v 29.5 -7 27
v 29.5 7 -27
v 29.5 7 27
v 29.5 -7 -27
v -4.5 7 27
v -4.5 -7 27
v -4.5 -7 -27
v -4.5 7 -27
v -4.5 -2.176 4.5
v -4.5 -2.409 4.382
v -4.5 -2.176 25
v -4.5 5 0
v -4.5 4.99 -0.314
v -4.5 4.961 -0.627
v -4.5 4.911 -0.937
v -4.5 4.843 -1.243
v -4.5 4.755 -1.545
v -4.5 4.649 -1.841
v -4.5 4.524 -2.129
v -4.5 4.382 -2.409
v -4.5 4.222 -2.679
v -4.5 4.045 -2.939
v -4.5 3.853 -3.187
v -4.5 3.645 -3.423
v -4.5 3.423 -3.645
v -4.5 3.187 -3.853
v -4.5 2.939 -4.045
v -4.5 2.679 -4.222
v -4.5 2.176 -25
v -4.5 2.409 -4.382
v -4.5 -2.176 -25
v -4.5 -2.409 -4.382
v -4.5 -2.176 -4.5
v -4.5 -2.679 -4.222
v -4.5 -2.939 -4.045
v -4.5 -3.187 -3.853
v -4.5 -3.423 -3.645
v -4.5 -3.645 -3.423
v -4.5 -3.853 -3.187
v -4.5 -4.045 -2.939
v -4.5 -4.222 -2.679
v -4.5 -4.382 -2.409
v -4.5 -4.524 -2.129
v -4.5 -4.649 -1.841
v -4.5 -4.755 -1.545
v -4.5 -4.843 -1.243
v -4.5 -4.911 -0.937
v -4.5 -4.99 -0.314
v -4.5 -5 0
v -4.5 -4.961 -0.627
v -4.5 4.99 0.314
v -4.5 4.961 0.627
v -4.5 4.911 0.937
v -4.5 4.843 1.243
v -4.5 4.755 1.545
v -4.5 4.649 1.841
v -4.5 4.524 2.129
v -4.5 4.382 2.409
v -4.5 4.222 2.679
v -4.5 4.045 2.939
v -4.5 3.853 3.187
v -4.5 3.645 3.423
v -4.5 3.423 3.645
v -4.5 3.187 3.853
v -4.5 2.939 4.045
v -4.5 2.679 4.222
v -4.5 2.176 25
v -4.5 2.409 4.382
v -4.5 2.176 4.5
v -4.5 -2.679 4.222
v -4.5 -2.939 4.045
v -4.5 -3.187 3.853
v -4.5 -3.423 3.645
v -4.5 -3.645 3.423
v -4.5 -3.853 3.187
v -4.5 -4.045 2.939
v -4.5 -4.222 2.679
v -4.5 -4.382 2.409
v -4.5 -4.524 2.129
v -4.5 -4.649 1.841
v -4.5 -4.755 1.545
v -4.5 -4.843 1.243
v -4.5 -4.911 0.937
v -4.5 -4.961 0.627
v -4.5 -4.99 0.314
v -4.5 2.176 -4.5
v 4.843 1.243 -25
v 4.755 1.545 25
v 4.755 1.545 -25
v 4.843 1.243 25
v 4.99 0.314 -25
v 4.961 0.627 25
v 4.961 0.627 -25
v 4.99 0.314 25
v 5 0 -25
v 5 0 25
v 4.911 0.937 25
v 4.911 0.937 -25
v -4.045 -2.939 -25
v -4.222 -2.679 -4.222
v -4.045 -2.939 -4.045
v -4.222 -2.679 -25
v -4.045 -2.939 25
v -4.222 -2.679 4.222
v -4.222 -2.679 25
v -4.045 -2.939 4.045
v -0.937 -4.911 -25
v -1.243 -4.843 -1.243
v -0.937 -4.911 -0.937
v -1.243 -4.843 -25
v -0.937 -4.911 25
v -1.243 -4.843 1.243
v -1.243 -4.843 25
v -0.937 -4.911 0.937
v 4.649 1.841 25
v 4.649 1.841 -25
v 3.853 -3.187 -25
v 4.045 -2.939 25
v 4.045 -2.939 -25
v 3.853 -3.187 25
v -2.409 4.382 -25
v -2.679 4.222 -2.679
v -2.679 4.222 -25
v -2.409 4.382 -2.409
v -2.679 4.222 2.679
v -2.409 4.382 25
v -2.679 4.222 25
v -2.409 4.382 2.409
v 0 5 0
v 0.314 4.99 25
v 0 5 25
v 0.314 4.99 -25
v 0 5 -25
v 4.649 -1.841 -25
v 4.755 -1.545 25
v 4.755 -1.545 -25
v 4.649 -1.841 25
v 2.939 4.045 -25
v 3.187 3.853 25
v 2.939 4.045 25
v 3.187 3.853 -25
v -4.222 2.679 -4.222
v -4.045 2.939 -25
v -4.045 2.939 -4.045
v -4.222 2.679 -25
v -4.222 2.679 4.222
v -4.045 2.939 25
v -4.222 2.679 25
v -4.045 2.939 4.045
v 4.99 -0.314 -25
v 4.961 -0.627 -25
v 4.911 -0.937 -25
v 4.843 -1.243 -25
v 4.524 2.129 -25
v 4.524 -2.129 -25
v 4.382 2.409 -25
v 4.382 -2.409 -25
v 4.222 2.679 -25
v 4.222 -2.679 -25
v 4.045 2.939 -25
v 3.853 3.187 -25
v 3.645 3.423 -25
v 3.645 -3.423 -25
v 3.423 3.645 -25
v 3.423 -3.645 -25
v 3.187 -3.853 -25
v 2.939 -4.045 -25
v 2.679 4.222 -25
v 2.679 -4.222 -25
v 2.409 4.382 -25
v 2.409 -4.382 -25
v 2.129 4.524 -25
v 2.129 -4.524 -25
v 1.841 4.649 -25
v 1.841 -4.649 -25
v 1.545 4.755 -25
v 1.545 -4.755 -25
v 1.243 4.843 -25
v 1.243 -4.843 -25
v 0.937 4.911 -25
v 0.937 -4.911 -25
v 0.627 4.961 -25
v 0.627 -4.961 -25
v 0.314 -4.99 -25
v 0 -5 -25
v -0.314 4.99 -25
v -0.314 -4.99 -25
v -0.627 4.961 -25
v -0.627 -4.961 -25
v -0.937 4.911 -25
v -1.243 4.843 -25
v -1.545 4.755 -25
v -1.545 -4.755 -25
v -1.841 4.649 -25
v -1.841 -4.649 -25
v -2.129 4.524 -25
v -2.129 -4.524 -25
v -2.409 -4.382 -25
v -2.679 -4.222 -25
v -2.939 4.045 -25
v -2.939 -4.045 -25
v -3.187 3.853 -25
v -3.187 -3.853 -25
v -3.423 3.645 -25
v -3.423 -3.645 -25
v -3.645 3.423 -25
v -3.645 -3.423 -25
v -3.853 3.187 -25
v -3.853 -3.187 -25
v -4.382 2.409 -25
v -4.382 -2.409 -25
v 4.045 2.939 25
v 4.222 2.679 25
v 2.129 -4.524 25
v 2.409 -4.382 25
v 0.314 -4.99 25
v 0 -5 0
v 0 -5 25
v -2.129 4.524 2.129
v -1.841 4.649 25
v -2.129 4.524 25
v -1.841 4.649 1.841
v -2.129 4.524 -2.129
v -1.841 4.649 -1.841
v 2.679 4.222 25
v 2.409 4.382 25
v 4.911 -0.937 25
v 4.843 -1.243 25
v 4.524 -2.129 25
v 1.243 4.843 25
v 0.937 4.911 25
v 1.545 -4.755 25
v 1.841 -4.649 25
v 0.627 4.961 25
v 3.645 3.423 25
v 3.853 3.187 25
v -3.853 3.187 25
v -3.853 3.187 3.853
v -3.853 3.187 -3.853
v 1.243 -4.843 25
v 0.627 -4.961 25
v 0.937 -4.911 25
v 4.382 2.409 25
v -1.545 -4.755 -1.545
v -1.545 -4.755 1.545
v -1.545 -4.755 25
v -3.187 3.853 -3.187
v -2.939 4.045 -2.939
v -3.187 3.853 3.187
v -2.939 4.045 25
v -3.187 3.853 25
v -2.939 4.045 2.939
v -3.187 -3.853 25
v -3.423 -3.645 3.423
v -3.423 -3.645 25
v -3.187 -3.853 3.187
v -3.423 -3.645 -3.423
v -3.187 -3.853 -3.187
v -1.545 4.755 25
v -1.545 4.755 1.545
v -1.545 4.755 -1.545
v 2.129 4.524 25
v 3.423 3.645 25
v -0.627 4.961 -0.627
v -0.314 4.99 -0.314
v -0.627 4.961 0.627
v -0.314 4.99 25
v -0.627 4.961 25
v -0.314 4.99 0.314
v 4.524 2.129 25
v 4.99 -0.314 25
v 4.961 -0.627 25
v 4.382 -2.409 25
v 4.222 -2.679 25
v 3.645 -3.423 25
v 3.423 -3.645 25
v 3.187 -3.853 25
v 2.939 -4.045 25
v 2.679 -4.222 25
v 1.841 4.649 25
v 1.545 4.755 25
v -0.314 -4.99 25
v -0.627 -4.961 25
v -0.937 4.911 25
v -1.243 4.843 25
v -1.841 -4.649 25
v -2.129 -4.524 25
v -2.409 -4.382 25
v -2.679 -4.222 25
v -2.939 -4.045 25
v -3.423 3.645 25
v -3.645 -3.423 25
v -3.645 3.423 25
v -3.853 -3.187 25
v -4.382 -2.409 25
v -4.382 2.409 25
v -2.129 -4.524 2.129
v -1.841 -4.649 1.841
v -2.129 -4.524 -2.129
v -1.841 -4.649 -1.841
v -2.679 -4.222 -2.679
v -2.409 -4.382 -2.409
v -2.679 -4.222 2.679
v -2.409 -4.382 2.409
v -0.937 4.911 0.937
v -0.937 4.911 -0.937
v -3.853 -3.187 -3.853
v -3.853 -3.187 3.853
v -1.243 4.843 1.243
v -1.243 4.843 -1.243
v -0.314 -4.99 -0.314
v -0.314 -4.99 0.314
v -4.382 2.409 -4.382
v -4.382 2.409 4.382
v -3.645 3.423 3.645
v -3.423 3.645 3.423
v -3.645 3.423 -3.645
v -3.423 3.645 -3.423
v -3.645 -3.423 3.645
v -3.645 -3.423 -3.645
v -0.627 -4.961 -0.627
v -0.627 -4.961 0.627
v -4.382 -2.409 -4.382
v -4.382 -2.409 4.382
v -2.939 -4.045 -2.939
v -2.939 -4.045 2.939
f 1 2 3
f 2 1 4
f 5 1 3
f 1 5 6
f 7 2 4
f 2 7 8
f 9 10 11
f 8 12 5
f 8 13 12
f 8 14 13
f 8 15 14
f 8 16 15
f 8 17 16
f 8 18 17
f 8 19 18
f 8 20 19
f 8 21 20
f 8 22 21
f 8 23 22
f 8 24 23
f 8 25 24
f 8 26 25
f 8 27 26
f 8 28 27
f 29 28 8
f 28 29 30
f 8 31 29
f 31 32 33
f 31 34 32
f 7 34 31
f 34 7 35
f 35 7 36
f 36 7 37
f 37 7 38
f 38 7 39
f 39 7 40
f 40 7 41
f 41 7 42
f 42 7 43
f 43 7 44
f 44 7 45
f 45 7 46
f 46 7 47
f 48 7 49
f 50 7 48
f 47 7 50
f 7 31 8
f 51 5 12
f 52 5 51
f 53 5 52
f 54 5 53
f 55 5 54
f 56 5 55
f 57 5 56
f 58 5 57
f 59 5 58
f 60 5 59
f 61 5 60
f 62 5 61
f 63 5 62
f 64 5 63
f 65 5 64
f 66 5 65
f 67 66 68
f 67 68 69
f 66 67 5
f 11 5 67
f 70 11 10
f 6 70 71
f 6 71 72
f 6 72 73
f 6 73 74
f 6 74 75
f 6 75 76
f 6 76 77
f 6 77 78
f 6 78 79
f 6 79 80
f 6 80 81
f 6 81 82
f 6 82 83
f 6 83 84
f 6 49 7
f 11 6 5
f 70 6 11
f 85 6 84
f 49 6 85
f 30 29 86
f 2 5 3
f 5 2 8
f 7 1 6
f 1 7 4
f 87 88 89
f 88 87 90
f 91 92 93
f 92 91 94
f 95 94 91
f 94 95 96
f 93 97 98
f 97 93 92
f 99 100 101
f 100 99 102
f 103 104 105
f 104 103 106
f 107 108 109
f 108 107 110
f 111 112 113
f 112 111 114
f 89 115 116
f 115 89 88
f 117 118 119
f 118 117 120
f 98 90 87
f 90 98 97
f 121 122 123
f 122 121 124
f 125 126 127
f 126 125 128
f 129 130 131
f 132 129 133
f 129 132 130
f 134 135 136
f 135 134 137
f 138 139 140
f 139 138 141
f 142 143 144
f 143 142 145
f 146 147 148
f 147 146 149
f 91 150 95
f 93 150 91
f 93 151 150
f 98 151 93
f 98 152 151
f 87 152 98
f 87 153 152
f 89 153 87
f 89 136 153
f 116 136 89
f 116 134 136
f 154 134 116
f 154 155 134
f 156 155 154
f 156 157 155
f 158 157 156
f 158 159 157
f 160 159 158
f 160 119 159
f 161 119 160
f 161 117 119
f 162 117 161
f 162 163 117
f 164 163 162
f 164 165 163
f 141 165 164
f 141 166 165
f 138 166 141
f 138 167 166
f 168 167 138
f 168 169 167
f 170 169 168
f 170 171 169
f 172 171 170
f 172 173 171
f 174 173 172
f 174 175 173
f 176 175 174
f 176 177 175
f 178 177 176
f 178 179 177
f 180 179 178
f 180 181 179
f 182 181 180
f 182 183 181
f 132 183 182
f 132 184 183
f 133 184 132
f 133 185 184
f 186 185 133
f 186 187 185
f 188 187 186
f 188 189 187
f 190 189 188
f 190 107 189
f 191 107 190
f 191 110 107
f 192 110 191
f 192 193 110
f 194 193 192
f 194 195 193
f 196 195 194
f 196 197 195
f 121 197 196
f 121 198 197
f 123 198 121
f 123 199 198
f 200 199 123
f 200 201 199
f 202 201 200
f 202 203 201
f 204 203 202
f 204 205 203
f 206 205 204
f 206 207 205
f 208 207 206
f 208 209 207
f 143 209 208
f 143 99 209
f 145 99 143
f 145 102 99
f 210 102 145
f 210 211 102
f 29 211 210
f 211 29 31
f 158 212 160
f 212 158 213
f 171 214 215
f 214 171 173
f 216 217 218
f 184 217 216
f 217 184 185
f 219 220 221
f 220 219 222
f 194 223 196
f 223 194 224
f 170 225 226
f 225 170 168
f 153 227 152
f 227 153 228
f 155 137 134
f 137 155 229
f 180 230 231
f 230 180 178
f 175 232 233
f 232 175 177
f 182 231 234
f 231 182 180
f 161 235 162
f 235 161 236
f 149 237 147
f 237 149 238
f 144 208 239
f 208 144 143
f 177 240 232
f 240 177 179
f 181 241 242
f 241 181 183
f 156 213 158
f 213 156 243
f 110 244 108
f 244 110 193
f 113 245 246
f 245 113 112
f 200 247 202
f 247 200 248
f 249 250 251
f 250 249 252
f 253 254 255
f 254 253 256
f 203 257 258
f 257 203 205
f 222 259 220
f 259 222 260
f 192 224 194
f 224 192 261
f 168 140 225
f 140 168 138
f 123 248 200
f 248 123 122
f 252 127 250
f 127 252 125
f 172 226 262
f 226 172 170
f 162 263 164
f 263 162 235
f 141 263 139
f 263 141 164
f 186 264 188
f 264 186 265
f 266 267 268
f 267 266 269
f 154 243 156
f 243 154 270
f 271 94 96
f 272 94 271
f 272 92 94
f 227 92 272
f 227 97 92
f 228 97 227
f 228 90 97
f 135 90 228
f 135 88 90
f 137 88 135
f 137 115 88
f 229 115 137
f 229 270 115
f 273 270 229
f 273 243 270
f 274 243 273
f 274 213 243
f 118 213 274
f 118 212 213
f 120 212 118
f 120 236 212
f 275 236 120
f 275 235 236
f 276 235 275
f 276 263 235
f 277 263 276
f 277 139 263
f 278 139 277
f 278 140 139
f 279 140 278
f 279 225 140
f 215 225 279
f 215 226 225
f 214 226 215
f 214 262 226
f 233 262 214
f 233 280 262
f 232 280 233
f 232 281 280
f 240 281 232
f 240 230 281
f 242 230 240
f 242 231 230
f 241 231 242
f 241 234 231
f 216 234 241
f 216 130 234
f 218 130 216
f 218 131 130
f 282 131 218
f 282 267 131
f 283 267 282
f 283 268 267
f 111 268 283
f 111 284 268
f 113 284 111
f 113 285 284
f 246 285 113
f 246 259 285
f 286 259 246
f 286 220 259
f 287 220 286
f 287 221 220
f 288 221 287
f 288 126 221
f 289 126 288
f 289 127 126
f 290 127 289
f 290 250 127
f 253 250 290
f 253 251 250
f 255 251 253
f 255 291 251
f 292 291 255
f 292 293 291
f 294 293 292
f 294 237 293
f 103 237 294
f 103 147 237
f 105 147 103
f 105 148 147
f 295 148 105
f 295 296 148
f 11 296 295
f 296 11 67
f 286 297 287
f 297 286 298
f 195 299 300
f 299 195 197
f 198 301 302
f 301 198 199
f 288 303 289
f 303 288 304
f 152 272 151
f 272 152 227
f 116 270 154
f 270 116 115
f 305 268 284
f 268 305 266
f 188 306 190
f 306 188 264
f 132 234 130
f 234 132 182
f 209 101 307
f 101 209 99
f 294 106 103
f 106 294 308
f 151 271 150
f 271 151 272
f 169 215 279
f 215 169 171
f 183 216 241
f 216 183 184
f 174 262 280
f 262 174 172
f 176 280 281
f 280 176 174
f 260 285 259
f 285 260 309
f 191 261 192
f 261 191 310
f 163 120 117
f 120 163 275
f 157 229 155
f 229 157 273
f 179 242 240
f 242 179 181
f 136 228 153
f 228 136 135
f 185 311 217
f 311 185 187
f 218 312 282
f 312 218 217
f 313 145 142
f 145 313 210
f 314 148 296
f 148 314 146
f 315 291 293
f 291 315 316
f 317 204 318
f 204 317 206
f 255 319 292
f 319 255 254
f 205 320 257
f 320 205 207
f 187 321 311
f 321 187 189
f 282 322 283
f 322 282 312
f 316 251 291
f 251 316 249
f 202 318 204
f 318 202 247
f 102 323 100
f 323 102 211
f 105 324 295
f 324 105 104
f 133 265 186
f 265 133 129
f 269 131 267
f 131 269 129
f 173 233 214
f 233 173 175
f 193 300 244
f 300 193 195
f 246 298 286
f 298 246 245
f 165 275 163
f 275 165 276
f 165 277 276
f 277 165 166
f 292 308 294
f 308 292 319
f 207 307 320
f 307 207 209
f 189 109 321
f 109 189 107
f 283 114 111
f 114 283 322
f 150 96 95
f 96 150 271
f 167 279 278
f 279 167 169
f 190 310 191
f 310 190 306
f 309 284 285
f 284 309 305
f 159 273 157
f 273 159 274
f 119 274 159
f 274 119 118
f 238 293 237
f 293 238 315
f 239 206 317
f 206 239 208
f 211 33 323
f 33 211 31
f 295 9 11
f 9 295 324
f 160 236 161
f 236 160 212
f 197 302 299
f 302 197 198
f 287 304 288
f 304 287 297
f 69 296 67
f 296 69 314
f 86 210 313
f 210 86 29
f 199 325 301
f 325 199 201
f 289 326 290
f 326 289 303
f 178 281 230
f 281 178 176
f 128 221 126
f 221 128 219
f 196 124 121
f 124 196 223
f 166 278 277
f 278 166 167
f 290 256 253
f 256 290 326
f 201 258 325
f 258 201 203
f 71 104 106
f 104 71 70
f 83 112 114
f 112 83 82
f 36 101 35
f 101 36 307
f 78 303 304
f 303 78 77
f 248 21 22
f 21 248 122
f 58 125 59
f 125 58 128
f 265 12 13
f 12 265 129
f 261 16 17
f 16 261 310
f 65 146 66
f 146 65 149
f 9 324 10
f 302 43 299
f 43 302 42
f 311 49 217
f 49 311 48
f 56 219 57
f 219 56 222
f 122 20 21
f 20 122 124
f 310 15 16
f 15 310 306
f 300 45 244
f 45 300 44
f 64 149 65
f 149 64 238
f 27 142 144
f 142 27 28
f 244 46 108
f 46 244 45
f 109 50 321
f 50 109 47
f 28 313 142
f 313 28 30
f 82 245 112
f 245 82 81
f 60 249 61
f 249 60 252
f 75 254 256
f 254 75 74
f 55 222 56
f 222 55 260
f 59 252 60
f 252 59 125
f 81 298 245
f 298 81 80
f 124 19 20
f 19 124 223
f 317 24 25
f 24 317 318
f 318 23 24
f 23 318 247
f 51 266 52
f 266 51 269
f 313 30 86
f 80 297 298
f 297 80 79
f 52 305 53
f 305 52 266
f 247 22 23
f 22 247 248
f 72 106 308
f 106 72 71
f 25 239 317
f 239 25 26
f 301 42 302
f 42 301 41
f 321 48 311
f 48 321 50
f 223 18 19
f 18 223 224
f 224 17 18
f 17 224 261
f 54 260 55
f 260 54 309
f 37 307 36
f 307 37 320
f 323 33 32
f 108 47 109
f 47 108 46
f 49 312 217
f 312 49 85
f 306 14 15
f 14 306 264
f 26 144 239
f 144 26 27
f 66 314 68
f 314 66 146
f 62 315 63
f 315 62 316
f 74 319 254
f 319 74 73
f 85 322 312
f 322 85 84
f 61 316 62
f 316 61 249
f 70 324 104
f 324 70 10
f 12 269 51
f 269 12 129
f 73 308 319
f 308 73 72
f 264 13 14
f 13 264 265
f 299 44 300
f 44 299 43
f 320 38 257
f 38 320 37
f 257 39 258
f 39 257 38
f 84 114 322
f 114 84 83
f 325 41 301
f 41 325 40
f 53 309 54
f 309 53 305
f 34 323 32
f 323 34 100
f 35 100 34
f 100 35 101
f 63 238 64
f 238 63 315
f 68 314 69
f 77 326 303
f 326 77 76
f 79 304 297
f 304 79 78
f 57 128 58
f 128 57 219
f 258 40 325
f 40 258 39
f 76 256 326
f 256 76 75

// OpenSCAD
/* 
	Supplemental T-Junction 8

*/

$fn = 100;  // Increase the resolution of the cylinders
pipe_radius = 5;
pipe_length = 50;

// Define the cube dimensions
cube_size = [pipe_length/2 + pipe_radius + 4, 2*pipe_radius + 4, pipe_length + 4];

difference() {
    // Create the cube, shifted to encapsulate the x-axis pipe
    translate([pipe_length/4, 0, 0])
    cube(cube_size, center=true);

    // Subtract the x-axis pipe
    translate([0, 0, 0])
    cylinder(h=pipe_length, r=pipe_radius, center=true);

    // Subtract the y-axis pipe
    rotate([0, 90, 0])
    translate([0, 0, -pipe_length/2])
    cylinder(h=pipe_length, r=pipe_radius, center=true);
}
